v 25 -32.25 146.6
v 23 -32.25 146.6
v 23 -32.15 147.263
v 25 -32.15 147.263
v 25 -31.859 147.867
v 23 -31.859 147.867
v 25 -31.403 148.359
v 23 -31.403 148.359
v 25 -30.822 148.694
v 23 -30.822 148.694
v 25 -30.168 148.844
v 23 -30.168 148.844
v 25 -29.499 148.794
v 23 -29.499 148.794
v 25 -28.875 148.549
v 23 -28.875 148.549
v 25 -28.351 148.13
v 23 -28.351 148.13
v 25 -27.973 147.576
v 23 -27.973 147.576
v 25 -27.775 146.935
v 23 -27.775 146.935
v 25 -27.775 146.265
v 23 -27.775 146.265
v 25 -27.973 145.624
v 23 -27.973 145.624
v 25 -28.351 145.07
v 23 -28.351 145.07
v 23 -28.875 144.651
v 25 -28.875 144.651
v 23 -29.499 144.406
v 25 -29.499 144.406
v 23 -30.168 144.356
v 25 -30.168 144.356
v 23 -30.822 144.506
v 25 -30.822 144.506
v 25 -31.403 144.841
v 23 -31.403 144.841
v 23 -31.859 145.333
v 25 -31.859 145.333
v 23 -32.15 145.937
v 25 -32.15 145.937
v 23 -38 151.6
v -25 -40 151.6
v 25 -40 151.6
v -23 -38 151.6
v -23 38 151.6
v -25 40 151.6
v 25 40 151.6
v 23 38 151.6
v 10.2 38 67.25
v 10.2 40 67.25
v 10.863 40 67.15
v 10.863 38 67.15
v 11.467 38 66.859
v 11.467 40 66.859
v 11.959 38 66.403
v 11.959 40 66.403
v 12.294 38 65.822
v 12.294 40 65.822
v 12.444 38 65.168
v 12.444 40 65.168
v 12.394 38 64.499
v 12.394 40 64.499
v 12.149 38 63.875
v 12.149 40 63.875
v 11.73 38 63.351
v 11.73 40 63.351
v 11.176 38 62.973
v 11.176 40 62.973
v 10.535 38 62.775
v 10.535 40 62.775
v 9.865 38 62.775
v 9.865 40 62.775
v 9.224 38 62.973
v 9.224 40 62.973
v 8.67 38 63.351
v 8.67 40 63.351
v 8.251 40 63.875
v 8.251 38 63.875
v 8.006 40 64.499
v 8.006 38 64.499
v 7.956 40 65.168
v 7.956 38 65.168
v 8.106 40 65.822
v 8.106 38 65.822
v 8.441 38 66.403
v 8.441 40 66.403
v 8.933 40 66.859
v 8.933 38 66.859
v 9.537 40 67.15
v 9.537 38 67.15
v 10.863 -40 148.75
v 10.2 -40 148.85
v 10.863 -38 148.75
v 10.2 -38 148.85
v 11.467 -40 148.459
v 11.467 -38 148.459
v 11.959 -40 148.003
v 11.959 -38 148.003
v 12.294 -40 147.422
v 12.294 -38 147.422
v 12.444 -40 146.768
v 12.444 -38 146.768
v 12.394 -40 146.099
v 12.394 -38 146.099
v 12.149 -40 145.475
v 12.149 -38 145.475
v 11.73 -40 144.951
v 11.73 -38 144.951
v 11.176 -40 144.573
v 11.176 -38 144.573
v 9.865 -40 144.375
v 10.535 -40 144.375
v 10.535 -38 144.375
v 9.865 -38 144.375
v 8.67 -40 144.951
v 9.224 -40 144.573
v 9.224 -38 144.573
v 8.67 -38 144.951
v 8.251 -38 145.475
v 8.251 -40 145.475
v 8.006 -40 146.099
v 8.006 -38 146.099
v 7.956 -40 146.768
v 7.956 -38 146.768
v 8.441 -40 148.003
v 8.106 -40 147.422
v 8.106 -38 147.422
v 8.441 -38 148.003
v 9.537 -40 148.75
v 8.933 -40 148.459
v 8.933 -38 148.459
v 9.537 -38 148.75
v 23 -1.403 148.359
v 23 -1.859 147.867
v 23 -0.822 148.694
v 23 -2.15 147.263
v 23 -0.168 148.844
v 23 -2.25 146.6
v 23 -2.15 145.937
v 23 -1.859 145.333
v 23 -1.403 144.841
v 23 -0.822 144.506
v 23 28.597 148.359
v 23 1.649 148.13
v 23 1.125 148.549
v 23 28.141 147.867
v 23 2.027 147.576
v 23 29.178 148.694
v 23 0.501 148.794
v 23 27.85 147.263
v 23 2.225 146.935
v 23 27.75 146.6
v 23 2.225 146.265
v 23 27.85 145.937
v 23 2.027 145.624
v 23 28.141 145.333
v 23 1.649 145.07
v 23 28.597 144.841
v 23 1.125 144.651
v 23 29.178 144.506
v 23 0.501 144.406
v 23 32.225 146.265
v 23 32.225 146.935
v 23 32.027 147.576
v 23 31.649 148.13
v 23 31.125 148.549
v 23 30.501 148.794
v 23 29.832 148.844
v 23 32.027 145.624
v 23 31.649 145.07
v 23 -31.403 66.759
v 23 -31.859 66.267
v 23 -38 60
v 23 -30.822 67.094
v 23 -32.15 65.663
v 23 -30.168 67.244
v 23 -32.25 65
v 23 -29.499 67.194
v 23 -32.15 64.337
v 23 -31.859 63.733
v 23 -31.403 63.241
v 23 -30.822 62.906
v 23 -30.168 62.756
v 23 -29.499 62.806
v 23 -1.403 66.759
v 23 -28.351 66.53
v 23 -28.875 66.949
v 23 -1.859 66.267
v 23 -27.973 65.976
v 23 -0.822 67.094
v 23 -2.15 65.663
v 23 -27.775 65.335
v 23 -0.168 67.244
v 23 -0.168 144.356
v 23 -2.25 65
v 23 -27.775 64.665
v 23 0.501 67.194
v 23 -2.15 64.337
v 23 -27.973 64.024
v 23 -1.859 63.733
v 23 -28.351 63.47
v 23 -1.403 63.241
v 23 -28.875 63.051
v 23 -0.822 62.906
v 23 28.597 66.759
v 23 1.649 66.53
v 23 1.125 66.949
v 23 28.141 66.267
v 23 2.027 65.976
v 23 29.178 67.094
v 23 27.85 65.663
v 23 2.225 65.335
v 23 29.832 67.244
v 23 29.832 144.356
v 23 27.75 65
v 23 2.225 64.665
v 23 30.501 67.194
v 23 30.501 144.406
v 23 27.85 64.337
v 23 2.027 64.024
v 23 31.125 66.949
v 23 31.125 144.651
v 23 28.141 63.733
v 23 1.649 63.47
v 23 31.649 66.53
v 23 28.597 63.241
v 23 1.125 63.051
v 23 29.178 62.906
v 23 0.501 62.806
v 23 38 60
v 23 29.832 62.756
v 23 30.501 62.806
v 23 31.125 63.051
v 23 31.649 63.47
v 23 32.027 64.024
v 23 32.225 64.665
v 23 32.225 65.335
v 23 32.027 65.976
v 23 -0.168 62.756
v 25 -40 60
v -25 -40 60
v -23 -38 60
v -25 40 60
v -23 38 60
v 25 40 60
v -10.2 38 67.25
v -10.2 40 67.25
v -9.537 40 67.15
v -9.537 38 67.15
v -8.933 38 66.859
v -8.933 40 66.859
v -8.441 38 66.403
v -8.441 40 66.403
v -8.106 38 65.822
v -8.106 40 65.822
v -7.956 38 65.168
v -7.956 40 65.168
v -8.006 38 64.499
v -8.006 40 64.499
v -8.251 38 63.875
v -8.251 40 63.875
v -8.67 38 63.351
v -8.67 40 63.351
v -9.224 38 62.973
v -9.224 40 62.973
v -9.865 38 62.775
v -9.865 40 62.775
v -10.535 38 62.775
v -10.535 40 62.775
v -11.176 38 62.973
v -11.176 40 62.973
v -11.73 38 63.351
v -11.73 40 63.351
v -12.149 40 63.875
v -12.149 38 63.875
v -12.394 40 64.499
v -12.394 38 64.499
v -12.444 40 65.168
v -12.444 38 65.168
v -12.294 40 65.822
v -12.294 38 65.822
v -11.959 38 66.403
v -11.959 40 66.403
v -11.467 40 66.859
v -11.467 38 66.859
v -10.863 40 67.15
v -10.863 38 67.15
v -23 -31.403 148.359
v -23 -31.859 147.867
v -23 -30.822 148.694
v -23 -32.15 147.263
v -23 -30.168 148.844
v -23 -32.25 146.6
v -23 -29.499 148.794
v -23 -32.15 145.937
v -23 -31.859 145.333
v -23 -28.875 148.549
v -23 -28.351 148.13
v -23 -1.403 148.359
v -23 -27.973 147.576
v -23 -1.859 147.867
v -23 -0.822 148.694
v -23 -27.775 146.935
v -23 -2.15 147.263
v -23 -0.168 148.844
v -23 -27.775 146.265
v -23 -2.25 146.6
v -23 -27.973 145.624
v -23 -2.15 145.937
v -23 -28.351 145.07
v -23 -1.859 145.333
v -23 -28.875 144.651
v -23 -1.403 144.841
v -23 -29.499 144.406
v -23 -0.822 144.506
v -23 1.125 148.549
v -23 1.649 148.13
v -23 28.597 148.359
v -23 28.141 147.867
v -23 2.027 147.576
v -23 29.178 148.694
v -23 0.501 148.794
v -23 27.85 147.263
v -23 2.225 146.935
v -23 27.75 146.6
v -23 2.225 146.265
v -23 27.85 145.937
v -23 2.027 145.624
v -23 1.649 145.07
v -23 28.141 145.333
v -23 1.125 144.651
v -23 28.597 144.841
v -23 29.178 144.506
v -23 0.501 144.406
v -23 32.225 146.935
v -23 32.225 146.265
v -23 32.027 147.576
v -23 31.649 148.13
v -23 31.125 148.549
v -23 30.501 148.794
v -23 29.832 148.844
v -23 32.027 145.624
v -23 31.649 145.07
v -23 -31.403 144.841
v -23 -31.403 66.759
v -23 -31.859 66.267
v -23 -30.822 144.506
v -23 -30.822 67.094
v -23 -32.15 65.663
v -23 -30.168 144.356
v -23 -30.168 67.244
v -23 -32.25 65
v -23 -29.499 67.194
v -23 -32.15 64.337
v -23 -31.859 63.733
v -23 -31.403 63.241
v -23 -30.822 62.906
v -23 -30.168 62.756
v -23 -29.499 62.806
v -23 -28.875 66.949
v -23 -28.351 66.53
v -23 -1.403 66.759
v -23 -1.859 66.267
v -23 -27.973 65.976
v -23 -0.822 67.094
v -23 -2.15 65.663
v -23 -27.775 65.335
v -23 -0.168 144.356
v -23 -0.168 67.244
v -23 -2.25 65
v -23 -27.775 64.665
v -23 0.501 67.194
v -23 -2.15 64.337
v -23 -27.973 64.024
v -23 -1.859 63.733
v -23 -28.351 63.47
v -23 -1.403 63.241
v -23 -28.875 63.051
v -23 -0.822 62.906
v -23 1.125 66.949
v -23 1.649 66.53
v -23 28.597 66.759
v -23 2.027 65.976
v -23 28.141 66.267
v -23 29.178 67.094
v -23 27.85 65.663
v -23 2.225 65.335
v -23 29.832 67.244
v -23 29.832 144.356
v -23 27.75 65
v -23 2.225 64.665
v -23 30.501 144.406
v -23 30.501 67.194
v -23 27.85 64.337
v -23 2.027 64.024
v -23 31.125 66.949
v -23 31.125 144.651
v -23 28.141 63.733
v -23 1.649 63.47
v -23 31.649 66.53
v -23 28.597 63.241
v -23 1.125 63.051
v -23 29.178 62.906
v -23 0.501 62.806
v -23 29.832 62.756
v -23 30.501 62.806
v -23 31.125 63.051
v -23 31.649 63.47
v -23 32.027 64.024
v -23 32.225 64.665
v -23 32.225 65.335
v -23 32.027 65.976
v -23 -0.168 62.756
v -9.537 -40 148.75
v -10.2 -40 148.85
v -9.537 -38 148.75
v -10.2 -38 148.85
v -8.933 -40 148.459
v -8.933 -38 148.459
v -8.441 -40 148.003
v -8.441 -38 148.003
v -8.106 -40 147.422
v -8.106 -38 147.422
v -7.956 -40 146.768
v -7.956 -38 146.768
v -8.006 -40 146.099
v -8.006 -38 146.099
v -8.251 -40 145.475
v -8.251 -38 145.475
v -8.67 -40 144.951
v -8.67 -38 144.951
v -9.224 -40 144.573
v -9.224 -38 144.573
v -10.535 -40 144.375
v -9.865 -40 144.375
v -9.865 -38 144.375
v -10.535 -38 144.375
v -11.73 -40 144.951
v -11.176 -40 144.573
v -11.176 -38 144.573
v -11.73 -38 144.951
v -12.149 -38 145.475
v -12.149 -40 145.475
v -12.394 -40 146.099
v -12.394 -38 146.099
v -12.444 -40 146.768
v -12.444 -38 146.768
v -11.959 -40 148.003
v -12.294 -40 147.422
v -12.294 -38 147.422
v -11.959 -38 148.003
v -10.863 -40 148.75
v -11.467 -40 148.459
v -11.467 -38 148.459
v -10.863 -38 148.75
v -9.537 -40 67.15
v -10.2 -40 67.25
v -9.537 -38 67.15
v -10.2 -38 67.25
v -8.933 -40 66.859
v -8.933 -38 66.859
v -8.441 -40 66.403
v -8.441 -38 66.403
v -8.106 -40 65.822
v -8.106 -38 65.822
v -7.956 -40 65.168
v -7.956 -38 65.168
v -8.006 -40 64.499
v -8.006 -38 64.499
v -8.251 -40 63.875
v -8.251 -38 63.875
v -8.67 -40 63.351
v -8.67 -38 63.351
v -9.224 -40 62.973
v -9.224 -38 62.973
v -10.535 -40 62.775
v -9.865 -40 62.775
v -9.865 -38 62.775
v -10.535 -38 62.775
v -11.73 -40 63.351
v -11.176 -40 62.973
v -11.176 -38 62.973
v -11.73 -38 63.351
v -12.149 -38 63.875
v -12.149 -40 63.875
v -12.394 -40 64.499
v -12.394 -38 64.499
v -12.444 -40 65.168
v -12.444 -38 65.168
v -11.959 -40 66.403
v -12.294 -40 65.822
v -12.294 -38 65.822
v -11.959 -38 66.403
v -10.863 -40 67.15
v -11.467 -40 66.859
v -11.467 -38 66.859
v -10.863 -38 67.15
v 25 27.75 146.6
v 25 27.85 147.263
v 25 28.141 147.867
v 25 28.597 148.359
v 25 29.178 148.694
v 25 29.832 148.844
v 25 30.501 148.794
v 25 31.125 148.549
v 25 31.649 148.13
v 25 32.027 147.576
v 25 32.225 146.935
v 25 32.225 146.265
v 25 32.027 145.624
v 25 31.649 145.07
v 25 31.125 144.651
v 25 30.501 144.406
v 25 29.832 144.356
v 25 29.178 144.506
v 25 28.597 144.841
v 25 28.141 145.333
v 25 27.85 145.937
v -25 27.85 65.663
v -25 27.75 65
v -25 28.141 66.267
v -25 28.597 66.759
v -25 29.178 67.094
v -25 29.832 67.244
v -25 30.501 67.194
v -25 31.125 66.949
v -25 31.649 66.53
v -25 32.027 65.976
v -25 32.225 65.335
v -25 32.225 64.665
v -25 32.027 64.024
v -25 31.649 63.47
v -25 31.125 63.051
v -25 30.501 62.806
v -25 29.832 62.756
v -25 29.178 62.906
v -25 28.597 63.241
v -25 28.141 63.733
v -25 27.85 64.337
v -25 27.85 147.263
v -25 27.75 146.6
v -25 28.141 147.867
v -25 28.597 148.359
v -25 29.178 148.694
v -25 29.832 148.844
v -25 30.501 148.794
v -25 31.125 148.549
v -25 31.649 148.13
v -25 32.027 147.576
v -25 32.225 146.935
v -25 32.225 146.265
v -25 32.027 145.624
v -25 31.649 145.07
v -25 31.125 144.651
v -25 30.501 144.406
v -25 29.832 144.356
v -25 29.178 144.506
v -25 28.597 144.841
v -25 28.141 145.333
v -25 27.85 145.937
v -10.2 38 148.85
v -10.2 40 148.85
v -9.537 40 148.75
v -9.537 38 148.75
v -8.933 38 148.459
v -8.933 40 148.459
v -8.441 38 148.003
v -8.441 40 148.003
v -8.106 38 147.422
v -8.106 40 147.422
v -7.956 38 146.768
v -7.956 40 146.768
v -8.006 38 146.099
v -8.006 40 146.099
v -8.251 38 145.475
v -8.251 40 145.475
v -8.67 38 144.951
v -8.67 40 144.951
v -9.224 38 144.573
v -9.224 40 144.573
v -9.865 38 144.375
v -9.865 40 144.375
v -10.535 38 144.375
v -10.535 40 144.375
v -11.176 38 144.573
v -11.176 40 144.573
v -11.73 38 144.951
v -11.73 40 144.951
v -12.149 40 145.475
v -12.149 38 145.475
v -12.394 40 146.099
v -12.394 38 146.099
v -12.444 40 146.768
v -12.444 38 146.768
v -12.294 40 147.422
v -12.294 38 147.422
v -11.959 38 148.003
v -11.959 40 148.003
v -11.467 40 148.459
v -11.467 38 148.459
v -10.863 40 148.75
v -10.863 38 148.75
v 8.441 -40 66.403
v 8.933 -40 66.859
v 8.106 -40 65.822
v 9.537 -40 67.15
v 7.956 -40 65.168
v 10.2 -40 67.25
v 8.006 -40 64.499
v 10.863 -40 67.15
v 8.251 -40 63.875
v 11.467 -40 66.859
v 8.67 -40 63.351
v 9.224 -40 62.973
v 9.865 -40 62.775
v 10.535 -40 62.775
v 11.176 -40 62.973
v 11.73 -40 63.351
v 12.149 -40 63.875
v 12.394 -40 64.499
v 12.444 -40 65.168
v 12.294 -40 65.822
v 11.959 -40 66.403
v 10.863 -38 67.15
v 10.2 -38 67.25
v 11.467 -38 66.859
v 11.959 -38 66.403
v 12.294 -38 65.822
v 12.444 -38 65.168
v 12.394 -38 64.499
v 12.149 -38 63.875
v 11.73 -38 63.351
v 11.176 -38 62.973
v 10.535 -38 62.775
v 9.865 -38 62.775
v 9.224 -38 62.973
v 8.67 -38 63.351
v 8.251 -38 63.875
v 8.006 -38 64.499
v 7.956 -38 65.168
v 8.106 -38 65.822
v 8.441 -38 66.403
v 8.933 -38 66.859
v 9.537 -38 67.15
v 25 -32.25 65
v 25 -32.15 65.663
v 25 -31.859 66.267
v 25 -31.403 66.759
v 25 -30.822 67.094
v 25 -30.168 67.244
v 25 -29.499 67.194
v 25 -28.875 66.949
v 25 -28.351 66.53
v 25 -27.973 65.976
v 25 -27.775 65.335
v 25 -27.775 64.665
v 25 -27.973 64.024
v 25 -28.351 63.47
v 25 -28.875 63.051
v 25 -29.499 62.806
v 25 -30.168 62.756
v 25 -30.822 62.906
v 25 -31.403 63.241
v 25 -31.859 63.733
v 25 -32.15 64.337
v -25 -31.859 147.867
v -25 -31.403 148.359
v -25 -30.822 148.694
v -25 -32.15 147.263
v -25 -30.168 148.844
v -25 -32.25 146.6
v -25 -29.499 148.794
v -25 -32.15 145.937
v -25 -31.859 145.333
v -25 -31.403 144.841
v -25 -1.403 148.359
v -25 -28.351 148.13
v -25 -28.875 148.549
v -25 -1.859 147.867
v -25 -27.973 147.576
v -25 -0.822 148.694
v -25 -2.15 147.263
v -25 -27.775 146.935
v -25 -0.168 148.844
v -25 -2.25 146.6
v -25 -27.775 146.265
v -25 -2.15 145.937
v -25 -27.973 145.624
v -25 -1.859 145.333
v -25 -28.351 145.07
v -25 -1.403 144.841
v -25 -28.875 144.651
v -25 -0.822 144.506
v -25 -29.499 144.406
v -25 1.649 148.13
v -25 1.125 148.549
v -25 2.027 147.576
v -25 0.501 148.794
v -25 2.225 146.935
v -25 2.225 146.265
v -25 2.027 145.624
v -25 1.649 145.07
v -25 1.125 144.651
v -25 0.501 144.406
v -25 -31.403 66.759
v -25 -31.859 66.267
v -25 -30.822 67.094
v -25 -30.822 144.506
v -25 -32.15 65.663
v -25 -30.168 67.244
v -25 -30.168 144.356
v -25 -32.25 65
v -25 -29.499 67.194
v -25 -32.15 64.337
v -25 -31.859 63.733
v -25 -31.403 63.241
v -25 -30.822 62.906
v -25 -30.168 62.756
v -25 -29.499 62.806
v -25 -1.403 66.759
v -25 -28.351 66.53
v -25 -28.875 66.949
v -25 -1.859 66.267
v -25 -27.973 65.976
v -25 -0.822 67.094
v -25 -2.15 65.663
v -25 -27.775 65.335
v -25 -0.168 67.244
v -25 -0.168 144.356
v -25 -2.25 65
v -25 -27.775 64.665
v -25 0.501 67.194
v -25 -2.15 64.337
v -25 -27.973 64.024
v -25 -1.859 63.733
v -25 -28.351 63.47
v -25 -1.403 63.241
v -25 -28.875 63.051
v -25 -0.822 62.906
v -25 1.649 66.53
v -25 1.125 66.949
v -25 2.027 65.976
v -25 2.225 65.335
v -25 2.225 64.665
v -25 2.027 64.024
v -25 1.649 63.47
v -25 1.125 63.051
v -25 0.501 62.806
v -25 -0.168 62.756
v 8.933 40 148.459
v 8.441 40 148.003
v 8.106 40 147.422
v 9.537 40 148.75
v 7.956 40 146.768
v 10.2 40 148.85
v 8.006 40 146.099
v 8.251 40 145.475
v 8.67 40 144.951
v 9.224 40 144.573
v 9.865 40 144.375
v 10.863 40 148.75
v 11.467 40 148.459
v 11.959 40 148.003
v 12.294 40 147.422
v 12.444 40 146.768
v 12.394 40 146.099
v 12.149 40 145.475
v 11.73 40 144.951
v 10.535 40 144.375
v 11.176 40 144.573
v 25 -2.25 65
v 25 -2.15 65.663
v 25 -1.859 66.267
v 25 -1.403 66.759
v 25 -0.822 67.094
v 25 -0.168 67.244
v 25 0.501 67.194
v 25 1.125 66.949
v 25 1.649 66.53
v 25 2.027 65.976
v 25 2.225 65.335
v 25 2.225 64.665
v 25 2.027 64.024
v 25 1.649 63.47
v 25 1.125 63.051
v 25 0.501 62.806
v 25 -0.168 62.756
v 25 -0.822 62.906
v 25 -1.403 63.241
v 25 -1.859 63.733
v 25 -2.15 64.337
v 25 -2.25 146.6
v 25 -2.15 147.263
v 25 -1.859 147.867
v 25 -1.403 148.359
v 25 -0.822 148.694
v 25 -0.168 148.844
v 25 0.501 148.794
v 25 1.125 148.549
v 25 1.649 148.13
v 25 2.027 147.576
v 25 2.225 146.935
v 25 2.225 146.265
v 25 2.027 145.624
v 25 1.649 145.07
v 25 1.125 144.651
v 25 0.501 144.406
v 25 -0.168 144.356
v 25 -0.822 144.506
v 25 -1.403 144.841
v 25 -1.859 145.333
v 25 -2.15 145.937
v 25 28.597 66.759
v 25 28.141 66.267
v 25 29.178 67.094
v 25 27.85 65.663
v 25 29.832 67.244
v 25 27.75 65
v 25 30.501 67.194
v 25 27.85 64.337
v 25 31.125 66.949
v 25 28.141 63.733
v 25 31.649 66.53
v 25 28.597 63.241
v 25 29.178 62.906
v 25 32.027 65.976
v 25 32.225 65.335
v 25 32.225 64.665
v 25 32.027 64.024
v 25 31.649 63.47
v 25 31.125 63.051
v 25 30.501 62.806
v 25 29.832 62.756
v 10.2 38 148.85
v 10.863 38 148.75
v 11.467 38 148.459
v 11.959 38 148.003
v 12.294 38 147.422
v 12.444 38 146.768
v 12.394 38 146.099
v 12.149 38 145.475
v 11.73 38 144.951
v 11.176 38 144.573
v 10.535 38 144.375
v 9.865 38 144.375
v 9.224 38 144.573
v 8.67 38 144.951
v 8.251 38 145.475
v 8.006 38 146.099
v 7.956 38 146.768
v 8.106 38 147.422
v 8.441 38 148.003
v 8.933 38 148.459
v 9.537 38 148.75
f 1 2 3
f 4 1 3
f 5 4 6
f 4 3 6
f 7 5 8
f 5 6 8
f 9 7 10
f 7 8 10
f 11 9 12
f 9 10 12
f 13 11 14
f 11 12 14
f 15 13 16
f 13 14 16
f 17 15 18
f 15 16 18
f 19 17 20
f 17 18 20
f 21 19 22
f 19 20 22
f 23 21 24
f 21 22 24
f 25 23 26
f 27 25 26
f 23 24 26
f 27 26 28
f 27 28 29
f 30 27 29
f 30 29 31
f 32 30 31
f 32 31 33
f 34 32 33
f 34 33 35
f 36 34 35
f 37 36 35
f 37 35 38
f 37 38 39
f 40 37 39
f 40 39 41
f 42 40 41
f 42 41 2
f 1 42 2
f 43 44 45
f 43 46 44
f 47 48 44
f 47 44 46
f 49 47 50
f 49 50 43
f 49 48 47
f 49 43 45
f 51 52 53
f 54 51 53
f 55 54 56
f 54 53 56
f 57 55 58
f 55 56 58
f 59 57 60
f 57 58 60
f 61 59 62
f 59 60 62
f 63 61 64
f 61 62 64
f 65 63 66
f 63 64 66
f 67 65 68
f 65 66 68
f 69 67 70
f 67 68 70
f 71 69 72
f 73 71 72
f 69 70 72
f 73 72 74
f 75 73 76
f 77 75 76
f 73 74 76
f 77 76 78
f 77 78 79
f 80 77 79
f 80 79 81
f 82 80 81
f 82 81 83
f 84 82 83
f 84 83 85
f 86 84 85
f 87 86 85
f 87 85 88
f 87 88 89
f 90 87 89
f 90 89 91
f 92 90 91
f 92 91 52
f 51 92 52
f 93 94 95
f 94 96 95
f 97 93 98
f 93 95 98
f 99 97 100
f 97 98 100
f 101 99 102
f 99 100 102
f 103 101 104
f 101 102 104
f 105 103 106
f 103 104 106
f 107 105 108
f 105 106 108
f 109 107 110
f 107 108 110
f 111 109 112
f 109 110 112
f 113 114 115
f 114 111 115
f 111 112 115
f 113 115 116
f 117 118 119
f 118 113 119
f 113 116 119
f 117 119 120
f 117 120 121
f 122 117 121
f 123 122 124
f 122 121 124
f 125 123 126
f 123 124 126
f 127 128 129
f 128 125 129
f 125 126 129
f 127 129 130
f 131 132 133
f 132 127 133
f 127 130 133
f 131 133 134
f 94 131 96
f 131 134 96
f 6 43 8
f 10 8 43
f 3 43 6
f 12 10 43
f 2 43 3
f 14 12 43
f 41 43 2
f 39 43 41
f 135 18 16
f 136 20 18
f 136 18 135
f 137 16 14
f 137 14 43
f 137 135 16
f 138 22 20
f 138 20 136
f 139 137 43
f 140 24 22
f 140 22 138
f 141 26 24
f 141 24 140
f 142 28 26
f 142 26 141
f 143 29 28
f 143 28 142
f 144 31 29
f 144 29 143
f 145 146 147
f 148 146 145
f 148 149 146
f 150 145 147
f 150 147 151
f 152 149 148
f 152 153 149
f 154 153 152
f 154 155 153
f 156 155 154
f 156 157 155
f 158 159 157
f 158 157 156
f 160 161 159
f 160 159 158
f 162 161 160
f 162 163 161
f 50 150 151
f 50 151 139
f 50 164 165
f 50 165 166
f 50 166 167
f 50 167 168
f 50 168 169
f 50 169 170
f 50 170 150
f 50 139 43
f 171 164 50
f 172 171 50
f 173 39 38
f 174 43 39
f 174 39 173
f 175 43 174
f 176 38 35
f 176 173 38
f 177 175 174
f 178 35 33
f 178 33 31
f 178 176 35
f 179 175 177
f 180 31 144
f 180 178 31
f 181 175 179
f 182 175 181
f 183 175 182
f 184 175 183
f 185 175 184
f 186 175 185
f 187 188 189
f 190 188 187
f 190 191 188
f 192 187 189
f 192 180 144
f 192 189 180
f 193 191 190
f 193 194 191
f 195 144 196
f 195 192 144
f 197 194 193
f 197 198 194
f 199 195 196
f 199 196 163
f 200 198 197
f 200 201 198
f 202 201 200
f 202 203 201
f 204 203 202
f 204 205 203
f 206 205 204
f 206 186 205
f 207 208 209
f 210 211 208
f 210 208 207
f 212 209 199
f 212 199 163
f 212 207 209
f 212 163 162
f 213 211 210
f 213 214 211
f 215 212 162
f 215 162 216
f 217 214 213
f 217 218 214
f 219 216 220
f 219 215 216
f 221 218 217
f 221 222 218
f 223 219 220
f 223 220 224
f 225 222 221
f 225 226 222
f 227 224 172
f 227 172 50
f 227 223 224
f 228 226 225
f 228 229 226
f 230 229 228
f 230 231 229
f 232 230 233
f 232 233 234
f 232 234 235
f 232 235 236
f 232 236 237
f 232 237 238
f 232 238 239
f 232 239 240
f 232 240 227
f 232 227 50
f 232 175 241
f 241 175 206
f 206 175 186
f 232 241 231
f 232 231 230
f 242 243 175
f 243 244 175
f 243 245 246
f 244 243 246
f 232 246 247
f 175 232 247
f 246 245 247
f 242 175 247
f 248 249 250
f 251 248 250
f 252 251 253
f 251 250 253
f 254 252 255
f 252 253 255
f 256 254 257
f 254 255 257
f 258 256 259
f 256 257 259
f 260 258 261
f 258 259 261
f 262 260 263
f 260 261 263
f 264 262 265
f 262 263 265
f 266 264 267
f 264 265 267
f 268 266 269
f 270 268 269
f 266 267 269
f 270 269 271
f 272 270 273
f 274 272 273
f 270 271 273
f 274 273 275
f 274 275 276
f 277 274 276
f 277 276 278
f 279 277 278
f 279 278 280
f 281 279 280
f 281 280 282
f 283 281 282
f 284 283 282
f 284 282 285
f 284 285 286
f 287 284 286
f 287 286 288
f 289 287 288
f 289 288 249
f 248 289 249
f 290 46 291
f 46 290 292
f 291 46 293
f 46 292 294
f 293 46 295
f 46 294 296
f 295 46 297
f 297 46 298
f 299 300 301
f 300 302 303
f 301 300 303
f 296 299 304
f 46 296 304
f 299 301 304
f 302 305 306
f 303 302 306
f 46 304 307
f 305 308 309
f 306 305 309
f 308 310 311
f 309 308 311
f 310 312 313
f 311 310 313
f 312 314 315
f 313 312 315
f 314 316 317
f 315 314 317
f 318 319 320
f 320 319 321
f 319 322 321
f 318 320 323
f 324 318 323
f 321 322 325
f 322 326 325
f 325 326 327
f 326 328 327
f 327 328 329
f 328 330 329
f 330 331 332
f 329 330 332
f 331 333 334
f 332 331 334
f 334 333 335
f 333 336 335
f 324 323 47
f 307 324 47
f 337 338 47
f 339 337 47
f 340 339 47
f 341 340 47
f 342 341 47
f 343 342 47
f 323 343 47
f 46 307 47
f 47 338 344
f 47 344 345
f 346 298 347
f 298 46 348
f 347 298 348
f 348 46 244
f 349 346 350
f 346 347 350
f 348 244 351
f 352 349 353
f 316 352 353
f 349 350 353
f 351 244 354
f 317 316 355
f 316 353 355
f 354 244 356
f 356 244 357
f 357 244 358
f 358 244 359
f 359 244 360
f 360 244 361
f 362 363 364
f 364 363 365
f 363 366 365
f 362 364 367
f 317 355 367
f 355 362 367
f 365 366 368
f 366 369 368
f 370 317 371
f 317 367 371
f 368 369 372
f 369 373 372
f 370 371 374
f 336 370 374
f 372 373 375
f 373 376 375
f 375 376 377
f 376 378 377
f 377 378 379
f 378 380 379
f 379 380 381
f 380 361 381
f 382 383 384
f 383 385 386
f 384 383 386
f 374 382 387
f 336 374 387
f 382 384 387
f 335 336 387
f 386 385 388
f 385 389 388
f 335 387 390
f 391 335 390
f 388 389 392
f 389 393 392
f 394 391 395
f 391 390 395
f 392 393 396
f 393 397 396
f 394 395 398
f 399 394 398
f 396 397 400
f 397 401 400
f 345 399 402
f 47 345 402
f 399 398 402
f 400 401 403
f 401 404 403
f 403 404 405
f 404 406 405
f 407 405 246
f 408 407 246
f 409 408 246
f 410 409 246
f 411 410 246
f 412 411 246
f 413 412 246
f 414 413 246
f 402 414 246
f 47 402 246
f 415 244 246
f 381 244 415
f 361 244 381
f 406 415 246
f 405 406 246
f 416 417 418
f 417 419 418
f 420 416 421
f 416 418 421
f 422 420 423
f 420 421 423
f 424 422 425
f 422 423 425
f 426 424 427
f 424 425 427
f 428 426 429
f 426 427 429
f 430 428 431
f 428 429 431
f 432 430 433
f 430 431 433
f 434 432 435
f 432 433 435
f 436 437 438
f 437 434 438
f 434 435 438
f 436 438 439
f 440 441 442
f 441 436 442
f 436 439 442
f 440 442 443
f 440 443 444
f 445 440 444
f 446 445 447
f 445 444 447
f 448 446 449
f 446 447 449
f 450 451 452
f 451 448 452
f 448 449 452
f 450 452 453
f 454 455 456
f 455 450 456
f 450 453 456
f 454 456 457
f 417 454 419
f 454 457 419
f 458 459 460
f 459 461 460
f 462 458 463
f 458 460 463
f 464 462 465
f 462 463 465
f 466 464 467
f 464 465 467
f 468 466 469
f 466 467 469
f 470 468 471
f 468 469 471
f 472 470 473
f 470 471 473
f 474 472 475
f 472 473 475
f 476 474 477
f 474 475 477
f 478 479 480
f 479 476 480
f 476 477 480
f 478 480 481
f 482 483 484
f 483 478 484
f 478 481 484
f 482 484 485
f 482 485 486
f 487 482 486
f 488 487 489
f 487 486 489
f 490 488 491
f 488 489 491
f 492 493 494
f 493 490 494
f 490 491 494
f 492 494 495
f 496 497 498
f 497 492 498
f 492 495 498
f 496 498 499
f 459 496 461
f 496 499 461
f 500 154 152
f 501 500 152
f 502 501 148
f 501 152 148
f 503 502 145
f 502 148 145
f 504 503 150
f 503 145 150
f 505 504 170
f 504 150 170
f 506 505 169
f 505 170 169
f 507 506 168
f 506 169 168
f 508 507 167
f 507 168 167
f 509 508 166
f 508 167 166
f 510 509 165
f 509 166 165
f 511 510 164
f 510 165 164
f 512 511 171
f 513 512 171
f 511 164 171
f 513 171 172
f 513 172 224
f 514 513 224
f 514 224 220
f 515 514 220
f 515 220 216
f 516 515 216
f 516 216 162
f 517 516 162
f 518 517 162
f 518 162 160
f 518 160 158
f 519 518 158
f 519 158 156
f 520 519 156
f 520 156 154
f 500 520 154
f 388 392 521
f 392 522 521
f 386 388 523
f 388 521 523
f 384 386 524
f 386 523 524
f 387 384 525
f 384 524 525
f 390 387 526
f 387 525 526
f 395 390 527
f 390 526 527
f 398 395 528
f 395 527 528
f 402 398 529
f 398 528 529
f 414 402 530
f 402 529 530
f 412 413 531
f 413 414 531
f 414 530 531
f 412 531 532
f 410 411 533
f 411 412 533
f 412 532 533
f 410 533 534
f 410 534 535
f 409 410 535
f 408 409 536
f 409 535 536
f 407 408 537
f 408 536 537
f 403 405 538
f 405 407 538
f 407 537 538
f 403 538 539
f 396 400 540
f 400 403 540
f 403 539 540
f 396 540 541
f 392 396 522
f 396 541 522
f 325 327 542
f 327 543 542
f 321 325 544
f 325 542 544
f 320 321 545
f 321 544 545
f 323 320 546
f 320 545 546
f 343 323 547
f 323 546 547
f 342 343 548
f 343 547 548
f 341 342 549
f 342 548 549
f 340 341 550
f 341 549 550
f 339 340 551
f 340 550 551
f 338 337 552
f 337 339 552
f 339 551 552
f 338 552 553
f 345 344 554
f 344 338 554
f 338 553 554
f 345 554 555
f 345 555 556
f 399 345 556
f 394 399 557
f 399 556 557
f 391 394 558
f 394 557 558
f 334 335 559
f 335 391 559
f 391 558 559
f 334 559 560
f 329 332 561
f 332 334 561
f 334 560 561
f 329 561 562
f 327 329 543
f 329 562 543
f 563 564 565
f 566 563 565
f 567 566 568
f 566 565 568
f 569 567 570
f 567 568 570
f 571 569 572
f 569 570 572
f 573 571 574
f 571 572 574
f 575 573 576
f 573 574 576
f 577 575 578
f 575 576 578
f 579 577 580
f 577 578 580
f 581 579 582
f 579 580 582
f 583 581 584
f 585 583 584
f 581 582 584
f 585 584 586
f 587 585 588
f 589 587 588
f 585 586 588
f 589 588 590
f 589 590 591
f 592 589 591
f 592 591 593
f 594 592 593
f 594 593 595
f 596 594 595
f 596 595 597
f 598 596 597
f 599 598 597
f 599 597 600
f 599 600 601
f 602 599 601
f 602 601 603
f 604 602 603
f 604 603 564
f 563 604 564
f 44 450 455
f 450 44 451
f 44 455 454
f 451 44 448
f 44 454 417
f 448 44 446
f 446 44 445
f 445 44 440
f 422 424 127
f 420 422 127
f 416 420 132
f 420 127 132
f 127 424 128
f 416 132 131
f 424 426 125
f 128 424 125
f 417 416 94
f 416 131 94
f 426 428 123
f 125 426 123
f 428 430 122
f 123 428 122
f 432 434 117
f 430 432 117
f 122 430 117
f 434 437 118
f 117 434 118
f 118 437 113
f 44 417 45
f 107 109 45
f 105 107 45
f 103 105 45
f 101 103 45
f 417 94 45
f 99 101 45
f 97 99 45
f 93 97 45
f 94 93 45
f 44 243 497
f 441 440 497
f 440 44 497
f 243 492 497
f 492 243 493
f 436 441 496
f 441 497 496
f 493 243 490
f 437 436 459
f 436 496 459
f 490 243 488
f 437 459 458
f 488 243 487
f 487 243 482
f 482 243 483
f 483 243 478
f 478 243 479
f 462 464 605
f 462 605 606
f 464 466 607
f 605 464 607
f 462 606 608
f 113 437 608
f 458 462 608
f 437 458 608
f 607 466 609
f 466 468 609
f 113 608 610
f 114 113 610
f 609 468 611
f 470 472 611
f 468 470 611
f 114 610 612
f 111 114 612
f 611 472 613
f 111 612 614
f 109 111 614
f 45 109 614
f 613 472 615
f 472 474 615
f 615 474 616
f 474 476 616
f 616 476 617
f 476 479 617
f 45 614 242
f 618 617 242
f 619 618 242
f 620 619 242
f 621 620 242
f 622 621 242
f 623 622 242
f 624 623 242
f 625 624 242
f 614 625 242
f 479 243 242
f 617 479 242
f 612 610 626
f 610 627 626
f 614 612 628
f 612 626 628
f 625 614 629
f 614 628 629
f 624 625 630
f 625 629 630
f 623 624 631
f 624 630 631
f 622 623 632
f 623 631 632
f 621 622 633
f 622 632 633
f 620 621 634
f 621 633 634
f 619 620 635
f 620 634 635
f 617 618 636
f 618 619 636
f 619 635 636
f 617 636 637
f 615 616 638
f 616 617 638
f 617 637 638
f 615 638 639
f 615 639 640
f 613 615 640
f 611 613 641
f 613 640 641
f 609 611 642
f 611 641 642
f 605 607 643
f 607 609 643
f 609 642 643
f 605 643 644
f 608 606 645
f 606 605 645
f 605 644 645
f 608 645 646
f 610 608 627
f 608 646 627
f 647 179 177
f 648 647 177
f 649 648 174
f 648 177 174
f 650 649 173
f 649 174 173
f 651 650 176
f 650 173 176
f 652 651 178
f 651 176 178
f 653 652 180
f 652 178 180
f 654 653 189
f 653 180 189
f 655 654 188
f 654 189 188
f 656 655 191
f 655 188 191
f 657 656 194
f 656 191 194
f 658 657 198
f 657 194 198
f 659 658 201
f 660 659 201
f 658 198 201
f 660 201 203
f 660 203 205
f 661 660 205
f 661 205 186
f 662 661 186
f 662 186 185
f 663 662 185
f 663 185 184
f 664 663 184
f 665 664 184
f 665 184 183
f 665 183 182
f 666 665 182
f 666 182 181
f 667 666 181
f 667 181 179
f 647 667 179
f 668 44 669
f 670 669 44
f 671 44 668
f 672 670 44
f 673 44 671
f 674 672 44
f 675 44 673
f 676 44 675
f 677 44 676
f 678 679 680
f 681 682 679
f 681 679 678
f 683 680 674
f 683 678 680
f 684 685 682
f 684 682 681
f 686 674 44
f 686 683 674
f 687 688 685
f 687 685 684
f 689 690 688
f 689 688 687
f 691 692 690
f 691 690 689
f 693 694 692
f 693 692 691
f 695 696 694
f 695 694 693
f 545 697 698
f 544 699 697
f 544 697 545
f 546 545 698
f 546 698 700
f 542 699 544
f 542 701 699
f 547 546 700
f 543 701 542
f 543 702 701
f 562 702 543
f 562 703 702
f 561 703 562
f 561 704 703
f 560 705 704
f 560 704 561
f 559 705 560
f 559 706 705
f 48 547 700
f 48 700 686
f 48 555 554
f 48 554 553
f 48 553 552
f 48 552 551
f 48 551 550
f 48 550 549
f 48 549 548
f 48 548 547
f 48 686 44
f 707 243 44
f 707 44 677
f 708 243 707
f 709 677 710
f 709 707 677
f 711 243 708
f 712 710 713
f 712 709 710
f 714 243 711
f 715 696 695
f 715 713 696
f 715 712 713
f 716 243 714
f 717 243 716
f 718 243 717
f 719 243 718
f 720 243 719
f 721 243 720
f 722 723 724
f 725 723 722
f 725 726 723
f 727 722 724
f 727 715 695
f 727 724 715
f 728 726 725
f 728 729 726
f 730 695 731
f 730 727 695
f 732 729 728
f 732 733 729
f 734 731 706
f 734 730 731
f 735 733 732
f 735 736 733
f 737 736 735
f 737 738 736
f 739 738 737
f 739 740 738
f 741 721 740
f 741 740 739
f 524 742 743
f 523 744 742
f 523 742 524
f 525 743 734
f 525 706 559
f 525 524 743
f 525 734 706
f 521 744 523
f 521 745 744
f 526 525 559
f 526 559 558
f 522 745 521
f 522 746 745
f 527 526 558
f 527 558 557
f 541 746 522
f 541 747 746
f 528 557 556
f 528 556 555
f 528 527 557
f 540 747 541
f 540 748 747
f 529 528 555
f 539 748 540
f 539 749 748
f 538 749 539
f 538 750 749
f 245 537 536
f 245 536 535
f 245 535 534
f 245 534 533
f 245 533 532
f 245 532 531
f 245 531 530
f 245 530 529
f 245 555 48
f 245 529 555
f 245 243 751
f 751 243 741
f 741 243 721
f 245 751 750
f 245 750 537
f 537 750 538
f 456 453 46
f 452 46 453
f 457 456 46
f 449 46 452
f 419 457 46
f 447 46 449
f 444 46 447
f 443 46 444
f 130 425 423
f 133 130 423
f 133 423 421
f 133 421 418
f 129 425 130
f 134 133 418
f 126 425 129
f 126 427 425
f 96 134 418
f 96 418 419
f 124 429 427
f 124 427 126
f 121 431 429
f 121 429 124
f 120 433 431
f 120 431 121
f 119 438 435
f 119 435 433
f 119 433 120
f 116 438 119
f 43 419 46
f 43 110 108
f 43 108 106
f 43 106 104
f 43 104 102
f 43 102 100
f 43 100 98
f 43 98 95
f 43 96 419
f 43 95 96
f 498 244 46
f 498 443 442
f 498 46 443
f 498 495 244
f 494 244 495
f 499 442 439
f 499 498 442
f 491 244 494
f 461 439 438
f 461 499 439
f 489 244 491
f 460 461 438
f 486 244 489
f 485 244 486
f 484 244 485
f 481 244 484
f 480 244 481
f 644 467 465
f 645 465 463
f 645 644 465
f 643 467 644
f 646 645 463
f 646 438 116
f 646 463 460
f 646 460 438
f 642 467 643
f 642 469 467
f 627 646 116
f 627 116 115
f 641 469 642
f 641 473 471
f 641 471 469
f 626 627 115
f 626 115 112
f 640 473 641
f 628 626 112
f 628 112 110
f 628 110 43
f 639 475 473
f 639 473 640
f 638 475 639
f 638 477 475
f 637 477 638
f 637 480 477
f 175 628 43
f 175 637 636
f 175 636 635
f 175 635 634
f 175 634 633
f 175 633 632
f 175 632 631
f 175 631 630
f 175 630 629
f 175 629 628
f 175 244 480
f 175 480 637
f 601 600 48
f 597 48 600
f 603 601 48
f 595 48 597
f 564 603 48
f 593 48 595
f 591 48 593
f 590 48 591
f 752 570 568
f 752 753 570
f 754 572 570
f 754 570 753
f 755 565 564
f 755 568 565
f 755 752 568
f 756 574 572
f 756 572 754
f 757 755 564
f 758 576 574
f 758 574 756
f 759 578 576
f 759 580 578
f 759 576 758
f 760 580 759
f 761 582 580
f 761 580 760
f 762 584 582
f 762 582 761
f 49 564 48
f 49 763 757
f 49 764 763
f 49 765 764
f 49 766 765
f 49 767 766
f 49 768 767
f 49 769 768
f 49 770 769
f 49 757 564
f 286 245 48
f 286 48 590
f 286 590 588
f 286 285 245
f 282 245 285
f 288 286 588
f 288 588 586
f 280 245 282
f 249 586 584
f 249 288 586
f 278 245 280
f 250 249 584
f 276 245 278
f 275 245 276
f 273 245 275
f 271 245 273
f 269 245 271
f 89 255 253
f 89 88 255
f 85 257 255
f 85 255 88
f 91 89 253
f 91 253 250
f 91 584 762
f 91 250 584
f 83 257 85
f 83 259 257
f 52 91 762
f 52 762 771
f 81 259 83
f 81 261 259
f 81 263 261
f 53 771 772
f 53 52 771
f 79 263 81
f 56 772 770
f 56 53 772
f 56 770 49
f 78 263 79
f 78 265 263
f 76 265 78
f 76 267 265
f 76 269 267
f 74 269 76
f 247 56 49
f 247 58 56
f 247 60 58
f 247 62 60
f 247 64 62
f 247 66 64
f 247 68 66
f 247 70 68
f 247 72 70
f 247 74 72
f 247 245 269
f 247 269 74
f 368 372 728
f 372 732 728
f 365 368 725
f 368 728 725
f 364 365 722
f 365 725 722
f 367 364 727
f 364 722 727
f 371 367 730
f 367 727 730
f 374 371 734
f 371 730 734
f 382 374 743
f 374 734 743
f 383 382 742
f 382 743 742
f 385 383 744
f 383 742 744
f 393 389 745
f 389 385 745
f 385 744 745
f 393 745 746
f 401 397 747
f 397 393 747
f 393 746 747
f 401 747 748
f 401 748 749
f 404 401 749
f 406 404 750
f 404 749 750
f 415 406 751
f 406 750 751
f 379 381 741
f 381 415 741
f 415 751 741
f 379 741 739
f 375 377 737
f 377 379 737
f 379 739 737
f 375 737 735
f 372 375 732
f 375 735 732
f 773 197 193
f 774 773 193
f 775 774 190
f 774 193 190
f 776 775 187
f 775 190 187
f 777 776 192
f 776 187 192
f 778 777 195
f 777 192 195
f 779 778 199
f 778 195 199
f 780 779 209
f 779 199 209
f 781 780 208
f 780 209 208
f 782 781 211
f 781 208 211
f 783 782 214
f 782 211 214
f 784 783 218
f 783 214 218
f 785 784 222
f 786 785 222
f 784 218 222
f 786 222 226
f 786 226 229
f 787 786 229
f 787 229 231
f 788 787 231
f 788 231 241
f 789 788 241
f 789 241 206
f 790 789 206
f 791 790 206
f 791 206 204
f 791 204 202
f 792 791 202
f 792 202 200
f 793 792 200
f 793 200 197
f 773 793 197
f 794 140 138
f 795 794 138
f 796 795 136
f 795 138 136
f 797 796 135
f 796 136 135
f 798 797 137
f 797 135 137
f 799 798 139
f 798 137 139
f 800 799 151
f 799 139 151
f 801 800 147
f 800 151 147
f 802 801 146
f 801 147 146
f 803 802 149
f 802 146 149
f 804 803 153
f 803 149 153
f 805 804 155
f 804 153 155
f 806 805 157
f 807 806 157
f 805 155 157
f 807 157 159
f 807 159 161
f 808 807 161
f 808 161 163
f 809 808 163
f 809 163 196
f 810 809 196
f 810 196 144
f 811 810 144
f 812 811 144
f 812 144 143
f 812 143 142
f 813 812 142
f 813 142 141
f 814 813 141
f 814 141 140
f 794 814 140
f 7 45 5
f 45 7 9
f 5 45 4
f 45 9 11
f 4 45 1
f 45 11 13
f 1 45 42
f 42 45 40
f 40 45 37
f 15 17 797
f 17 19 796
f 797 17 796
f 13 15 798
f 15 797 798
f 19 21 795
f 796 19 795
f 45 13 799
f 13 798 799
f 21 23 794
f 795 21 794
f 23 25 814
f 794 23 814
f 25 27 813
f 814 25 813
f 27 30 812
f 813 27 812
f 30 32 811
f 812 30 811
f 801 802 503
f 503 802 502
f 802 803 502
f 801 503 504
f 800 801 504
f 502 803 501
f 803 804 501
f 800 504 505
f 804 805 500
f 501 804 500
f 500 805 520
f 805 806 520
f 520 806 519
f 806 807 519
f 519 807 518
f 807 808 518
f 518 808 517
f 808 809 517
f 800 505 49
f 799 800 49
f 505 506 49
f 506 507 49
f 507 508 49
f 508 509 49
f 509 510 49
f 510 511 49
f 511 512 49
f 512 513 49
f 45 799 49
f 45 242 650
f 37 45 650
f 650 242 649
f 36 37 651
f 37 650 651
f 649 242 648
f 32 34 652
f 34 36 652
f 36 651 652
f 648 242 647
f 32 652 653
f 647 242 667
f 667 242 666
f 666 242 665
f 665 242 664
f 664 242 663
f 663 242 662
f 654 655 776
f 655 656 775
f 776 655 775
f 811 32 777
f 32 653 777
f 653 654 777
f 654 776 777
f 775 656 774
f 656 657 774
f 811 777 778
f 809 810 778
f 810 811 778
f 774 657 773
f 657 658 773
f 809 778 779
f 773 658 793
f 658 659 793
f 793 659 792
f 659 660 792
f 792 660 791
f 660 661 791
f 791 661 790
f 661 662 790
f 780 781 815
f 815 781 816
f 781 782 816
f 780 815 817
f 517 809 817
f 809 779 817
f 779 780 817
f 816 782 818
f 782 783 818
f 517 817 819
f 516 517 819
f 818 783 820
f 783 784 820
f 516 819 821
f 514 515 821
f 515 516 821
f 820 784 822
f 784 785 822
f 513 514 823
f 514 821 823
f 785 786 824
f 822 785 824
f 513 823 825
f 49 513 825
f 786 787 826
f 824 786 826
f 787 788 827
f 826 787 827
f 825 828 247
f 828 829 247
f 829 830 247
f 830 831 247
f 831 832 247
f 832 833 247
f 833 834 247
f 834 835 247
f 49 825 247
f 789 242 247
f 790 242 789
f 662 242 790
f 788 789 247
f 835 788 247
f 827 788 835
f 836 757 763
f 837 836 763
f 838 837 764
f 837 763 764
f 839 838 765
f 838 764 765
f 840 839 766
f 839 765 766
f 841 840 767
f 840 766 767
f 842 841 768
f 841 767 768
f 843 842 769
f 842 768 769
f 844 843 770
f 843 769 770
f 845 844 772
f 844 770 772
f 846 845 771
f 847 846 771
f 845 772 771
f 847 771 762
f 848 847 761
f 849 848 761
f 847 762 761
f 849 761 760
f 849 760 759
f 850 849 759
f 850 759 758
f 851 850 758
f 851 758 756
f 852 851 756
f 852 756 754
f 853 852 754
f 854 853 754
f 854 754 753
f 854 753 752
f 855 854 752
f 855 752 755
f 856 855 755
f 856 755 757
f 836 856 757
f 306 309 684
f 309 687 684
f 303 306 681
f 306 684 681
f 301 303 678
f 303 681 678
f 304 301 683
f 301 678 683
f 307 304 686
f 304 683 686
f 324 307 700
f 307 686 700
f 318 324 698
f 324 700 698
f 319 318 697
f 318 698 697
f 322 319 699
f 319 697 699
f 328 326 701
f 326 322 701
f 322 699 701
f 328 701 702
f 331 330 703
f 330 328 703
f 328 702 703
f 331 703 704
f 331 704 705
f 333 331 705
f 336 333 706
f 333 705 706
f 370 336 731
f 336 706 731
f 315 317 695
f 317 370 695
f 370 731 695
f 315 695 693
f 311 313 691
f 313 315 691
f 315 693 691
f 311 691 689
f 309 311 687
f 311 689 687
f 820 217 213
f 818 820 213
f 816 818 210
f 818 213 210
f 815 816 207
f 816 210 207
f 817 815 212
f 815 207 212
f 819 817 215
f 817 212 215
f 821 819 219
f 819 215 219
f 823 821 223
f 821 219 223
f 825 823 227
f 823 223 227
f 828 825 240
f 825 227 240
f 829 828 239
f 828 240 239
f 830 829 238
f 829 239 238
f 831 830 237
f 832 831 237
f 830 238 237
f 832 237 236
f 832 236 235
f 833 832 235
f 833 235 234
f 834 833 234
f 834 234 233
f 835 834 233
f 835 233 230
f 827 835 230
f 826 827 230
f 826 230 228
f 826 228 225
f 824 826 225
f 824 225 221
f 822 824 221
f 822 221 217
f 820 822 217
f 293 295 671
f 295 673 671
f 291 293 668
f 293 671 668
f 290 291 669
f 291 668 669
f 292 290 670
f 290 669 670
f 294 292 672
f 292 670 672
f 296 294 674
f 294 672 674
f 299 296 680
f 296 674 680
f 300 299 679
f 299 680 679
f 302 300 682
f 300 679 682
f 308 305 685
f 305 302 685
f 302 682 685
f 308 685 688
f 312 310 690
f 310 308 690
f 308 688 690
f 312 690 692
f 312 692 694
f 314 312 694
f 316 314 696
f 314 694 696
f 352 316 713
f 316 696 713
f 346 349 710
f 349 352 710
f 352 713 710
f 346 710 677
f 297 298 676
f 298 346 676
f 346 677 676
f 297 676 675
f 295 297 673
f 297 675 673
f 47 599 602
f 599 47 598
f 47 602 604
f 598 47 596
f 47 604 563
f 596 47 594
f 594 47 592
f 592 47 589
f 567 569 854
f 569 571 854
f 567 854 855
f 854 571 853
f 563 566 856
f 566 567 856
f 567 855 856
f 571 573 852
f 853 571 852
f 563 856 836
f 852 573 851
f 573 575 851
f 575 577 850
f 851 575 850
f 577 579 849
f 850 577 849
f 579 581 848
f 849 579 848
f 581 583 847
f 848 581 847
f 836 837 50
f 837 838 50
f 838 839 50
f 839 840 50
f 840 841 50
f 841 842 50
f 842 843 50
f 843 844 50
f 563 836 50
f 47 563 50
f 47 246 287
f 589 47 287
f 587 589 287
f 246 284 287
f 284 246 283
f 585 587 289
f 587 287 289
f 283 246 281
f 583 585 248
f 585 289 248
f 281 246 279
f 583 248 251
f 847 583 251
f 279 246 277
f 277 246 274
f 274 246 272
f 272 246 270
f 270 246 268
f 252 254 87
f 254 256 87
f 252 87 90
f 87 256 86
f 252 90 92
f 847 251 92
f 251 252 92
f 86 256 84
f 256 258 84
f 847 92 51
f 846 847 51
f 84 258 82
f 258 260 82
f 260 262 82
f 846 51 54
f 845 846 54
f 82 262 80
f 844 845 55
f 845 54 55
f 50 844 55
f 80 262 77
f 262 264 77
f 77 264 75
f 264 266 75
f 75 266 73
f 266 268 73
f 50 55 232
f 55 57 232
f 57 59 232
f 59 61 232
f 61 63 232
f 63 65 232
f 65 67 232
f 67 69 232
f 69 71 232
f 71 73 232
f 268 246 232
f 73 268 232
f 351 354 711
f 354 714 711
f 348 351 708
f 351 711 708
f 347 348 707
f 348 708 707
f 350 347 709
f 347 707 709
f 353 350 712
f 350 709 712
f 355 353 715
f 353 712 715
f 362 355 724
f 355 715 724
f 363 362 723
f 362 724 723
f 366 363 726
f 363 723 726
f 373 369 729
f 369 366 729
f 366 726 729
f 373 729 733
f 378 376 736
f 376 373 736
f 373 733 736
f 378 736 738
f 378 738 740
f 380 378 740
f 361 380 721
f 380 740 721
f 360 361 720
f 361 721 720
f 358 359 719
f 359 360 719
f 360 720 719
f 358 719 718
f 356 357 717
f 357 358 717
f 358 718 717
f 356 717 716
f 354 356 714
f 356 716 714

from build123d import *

# Parameters (mm, degrees)
SKETCH1_W                      = 50
SKETCH1_H                      = 80
SKETCH1_W_2                    = 46
SKETCH1_H_2                    = 76
BOSS_EXTRUDE1_DEPTH            = 91.6
M4_CLEARANCE_HOLE1_D           = 4.5
M4_CLEARANCE_HOLE1_ON_FACE_2_D = 4.5
M4_CLEARANCE_HOLE1_ON_FACE_3_D = 4.5
M4_CLEARANCE_HOLE1_ON_FACE_4_D = 4.5


with BuildPart() as part:
    # Sketch1 → Boss-Extrude1 (new body)
    with BuildSketch(Plane.XY.offset(60)):
        Rectangle(SKETCH1_W, SKETCH1_H)
        Rectangle(SKETCH1_W_2, SKETCH1_H_2, mode=Mode.SUBTRACT)
    extrude(amount=BOSS_EXTRUDE1_DEPTH)

    # M4 Clearance Hole1 (through all)
    with Locations(Plane(origin=(25, 30, 65), x_dir=(0, 1, 0), z_dir=(1, 0, 0))):
        with Locations((0, 0), (-30, 0), (-60, 0), (-60, 81.6), (-30, 81.6), (0, 81.6)):
            Hole(M4_CLEARANCE_HOLE1_D / 2)

    # M4 Clearance Hole1 on face 2 (through all)
    with Locations(Plane(origin=(10.2, -40, 65), x_dir=(0, 0, -1), z_dir=(0, -1, 0))):
        with Locations((0, 0), (0, -20.4), (-81.6, -20.4), (-81.6, 0)):
            Hole(M4_CLEARANCE_HOLE1_ON_FACE_2_D / 2)

    # M4 Clearance Hole1 on face 3 (through all)
    with Locations(Plane(origin=(-25, -30, 65), x_dir=(0, 0, -1), z_dir=(-1, 0, 0))):
        with Locations((0, 0), (0, -60), (0, -30), (-81.6, -60), (-81.6, -30), (-81.6, 0)):
            Hole(M4_CLEARANCE_HOLE1_ON_FACE_3_D / 2)

    # M4 Clearance Hole1 on face 4 (through all)
    with Locations(Plane(origin=(10.2, 40, 65), x_dir=(0, 0, 1), z_dir=(0, 1, 0))):
        with Locations((0, 0), (0, -20.4), (81.6, 0), (81.6, -20.4)):
            Hole(M4_CLEARANCE_HOLE1_ON_FACE_4_D / 2)


solid = part.part
